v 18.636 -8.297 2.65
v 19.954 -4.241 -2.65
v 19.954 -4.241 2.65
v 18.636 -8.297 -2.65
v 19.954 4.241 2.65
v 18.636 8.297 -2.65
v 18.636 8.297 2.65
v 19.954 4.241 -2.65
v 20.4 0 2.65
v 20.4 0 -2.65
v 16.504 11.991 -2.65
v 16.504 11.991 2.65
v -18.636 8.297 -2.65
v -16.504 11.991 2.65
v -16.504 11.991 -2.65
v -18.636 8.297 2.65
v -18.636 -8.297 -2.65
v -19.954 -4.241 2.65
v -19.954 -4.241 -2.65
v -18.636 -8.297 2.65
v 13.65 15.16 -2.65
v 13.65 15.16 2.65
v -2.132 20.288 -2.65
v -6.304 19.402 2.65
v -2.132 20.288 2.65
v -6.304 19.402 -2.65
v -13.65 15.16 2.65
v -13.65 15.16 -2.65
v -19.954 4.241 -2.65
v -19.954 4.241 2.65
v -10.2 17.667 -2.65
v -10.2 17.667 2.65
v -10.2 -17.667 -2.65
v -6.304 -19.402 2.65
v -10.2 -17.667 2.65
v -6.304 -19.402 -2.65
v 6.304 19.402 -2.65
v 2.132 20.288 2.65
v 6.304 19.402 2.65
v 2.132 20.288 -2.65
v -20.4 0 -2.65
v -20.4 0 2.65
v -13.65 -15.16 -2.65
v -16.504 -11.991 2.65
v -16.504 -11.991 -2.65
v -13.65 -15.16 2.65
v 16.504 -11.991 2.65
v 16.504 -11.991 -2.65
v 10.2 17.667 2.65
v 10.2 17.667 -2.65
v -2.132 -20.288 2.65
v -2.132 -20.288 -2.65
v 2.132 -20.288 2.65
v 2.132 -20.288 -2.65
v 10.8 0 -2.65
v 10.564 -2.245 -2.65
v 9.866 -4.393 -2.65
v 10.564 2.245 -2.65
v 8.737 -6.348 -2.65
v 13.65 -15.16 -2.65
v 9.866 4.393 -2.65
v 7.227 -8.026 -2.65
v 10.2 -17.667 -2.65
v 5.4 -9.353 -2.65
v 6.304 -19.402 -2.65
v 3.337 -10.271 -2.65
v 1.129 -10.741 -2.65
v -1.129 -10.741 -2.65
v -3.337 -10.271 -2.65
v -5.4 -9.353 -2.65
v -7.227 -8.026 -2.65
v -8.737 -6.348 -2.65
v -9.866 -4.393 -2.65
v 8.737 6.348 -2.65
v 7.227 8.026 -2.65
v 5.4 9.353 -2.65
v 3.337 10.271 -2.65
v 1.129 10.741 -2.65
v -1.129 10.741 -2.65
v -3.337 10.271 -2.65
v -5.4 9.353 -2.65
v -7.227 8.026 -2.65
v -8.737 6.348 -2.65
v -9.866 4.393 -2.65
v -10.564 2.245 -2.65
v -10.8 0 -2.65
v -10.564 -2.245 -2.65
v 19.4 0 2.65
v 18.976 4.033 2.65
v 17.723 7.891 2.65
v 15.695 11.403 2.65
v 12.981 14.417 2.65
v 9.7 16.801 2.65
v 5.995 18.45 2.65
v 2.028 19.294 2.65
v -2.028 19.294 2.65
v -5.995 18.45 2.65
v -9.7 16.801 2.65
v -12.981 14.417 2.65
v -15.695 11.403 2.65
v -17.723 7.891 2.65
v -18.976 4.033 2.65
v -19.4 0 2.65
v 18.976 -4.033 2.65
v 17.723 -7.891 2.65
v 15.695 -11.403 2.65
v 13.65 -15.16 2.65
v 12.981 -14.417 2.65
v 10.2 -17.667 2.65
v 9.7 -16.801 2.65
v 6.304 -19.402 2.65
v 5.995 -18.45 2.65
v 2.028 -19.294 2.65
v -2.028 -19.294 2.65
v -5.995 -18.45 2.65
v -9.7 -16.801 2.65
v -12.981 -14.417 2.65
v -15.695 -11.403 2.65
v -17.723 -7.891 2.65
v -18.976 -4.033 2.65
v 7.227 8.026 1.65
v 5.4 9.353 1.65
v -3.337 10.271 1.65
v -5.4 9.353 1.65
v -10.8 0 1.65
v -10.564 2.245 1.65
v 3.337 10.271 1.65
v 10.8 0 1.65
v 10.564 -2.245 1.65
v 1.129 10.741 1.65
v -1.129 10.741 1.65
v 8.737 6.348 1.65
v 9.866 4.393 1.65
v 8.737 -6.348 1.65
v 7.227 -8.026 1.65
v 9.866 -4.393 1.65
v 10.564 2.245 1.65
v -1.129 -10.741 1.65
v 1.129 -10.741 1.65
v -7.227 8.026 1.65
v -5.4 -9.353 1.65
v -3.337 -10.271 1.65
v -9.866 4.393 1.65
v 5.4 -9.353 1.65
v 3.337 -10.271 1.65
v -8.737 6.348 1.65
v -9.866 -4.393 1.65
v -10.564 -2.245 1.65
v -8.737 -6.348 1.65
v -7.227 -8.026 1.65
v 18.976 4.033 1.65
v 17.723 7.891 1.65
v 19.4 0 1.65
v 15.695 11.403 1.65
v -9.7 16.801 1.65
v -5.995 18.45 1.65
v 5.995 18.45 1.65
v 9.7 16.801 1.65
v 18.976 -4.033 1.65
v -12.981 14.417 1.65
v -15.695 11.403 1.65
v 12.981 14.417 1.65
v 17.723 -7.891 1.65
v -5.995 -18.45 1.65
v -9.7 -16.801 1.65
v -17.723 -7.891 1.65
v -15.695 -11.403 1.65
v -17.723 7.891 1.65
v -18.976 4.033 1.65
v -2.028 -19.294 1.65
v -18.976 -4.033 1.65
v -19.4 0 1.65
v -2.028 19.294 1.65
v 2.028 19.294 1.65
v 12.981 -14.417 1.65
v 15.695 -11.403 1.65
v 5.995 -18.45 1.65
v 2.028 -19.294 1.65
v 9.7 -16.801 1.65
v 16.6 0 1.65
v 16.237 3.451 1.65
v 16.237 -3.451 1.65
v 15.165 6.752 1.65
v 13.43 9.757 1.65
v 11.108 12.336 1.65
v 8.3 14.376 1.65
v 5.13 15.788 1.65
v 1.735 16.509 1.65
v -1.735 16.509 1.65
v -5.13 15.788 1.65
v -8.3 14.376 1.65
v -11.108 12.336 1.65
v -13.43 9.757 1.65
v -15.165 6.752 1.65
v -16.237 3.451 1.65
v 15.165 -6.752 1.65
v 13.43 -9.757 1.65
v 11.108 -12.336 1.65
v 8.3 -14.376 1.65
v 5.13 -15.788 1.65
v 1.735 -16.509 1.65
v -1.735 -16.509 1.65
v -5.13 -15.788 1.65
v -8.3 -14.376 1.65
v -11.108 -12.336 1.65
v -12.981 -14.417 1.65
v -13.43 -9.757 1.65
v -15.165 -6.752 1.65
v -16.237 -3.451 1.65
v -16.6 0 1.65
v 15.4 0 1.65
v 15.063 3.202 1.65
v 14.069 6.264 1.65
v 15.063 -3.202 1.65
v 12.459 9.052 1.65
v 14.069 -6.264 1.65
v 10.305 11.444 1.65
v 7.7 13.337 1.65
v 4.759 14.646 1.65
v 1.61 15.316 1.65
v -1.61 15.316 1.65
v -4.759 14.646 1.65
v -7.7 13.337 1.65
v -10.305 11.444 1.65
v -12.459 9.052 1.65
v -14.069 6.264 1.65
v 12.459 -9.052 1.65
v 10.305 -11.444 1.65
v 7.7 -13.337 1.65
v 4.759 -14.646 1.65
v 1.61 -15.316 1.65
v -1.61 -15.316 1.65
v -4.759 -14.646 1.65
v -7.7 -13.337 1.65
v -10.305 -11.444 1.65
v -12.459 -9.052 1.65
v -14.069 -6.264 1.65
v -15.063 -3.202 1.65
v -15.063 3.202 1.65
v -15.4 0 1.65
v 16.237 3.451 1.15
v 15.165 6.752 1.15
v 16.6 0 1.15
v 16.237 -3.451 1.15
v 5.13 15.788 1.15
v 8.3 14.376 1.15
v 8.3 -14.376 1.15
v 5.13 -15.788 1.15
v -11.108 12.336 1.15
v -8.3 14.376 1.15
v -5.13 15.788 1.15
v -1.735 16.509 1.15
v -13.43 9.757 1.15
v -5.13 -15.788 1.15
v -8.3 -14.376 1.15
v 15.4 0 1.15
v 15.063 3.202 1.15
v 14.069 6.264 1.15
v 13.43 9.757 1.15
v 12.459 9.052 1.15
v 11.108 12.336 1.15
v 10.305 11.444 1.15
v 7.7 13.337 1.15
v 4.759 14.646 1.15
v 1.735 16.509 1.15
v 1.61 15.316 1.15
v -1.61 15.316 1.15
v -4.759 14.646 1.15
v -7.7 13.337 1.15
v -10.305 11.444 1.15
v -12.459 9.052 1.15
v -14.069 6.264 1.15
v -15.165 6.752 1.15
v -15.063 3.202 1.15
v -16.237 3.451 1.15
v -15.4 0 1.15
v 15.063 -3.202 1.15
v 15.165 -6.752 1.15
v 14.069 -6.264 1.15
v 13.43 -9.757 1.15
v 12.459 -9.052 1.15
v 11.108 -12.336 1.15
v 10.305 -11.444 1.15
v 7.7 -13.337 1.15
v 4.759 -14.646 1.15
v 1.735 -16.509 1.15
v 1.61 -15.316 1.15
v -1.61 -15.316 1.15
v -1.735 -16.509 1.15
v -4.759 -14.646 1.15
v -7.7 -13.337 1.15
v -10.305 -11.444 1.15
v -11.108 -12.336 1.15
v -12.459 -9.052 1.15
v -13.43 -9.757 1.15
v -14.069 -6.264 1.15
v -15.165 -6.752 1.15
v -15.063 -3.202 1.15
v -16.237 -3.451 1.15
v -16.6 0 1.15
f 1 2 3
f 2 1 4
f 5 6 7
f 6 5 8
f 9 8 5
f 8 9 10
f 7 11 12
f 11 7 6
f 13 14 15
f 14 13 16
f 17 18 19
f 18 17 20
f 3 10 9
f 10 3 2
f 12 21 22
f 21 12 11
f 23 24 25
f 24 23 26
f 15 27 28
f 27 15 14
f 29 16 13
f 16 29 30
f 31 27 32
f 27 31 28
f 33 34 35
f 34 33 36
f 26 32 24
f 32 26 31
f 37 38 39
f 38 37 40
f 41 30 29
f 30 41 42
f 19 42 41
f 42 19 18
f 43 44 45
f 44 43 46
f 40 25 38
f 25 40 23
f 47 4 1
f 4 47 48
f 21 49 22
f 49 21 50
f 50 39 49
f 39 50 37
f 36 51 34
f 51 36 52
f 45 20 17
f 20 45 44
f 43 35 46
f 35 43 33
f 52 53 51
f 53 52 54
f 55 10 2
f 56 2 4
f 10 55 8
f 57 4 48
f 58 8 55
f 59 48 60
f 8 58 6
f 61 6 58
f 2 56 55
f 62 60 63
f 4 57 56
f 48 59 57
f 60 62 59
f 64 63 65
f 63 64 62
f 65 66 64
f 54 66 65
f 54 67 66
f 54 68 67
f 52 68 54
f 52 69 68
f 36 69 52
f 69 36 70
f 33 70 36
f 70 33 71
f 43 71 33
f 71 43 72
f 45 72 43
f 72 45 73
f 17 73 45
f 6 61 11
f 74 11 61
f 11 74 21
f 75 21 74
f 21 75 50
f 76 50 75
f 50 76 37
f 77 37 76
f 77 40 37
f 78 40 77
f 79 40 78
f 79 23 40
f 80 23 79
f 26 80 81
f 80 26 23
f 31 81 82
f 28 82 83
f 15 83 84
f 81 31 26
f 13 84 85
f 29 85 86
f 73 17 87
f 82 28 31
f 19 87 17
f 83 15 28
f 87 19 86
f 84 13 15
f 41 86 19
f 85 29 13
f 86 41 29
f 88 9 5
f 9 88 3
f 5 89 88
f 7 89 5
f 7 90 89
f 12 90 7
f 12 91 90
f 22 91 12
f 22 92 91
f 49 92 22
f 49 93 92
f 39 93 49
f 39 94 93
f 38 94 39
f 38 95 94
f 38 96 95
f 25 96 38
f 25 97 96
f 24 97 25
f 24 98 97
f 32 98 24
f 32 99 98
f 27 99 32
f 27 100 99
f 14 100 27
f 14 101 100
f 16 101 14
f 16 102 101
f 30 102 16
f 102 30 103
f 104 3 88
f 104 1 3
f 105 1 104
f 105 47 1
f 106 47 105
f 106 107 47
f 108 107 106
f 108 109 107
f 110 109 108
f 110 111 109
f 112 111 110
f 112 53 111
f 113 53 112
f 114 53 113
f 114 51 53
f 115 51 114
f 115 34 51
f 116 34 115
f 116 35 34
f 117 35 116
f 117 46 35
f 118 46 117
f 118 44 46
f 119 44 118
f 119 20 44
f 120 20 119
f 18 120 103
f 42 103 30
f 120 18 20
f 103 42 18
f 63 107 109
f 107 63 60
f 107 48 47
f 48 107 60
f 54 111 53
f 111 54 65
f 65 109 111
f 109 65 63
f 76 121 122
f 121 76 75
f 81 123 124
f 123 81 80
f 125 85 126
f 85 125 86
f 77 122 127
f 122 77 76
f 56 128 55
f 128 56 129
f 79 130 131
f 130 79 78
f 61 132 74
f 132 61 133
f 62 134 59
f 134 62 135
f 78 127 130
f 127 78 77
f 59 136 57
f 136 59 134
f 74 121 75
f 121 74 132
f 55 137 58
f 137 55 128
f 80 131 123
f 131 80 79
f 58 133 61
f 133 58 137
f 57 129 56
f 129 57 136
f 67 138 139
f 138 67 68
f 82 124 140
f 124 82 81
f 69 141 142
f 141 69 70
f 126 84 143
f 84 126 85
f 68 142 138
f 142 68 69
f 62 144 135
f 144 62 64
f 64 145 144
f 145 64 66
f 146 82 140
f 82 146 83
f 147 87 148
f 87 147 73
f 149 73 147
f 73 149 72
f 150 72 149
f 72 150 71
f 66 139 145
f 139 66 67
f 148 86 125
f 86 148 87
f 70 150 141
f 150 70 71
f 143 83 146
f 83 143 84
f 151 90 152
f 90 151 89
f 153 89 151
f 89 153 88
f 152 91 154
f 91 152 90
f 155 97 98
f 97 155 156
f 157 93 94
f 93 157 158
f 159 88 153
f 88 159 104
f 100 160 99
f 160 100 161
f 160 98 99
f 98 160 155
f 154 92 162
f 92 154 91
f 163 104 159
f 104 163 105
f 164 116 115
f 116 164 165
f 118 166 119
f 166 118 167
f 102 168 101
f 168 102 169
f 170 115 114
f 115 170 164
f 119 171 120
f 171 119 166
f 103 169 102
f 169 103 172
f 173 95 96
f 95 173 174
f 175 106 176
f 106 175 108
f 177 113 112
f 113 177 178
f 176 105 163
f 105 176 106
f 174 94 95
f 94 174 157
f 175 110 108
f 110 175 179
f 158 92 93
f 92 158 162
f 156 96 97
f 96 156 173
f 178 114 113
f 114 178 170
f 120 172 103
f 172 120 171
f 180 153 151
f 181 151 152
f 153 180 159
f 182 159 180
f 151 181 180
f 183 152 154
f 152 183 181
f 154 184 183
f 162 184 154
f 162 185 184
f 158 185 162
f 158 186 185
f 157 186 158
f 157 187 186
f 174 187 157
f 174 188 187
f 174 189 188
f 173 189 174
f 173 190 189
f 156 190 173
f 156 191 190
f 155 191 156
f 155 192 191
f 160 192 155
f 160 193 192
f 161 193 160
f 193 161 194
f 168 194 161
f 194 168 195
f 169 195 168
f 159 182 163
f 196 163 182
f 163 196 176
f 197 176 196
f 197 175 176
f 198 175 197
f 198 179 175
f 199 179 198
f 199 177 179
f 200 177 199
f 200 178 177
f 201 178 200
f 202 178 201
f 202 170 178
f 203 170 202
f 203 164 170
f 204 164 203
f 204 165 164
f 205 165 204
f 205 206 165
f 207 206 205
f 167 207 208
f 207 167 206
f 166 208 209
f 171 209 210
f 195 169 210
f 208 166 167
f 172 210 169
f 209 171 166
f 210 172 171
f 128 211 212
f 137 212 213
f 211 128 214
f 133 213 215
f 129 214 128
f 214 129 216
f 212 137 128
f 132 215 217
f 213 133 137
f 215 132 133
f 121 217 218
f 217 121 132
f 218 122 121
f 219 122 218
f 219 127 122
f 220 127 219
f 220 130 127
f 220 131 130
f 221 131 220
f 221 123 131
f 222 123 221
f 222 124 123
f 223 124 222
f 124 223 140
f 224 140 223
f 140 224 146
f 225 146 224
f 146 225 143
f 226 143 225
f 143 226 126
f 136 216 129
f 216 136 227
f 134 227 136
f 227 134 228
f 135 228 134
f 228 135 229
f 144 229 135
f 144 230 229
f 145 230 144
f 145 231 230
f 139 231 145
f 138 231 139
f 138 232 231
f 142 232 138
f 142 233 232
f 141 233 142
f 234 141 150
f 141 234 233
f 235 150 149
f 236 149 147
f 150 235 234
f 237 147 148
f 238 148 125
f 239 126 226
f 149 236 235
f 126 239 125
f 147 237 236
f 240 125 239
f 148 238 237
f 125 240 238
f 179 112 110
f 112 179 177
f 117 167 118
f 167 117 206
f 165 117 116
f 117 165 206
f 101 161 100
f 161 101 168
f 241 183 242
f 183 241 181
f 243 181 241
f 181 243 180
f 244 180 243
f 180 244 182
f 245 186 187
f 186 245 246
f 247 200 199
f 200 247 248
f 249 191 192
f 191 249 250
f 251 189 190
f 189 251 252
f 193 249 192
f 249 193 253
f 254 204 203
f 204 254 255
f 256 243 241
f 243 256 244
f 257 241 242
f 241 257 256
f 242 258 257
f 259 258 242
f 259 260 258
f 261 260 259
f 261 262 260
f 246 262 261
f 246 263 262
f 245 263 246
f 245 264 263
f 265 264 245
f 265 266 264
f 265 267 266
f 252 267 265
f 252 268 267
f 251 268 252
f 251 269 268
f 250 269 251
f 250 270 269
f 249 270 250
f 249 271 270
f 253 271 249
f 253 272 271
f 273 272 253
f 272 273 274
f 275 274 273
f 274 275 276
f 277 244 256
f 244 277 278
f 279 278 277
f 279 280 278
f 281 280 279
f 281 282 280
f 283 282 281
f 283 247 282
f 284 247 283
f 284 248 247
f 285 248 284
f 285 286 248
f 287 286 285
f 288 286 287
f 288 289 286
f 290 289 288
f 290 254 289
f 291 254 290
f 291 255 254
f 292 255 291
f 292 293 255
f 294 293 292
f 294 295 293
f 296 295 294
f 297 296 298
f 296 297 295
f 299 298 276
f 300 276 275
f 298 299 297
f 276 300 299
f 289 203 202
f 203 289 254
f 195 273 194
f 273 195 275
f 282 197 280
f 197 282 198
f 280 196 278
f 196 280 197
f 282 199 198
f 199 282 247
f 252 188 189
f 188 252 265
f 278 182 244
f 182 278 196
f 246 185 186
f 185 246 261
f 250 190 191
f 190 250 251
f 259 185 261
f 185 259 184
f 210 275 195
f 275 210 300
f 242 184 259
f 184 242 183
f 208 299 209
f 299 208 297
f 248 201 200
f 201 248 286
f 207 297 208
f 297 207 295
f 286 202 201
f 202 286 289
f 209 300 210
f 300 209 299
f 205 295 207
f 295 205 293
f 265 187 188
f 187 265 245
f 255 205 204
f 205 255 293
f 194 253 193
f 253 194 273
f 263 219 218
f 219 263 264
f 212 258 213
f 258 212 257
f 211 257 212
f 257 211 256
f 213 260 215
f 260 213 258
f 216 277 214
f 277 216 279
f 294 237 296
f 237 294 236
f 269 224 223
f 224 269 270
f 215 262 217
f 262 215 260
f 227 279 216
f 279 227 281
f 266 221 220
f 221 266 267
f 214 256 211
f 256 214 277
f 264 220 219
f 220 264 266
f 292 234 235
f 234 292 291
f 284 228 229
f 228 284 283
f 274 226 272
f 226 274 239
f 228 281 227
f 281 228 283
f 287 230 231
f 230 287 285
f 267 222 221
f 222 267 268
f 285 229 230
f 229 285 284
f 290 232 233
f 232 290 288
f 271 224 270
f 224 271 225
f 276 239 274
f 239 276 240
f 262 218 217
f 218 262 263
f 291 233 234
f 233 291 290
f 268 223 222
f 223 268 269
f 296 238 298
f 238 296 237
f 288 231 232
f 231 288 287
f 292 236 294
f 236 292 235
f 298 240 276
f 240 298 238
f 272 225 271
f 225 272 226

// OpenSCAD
// Parameters
outer_radius = 20.4; //[10.2:40.8:0.1]
inner_radius = 10.8; //[5.4:21.6:0.1]
height = 5.3; //[2.65:10.6:0.1]
edge_feature_size = 1.0; //[0.5:2.0:0.1]
overlap = 0.8; //[0.5:2.0:0.1]
center_mark_radius = 1.0; //[0.5:2.0:0.1]
center_mark_depth = 0.6; //[0.3:1.2:0.1]
groove_width = 1.2; //[0.6:2.4:0.1]
groove_depth = 0.7; //[0.3:1.4:0.1]
groove_radius = 16.0; //[12.0:19.0:0.1]

// Base Shapes
module radial_main_body() {
  cylinder(h=height, r=outer_radius, center=true);
}

module inner_bore() {
  cylinder(h=height + 2*overlap, r=inner_radius, center=true);
}

module edge_feature() {
  translate([0, 0, height/2 - edge_feature_size/2])
    cylinder(h=edge_feature_size, r=outer_radius - edge_feature_size, center=true);
}

module center_mark() {
  translate([0, 0, height/2 - center_mark_depth/2])
    cylinder(h=center_mark_depth + 2*overlap, r=center_mark_radius, center=true);
}

module decorative_groove() {
  translate([0, 0, height/2 - groove_depth/2])
    cylinder(h=groove_depth + 2*overlap, r=groove_radius + groove_width/2, center=true);
}

module decorative_groove_inner_cut() {
  translate([0, 0, height/2 - groove_depth/2])
    cylinder(h=groove_depth + 2*overlap, r=groove_radius - groove_width/2, center=true);
}

// Operations
module decorative_groove_ring() {
  difference() {
    decorative_groove();
    decorative_groove_inner_cut();
  }
}

module main_ring() {
  difference() {
    radial_main_body();
    inner_bore();
  }
}

module edge_feature_step() {
  difference() {
    main_ring();
    edge_feature();
  }
}

module with_center_mark() {
  difference() {
    edge_feature_step();
    center_mark();
  }
}

// Final Model
module final_model() {
  difference() {
    with_center_mark();
    decorative_groove_ring();
  }
}

// Render the final model
color("Silver") final_model();
